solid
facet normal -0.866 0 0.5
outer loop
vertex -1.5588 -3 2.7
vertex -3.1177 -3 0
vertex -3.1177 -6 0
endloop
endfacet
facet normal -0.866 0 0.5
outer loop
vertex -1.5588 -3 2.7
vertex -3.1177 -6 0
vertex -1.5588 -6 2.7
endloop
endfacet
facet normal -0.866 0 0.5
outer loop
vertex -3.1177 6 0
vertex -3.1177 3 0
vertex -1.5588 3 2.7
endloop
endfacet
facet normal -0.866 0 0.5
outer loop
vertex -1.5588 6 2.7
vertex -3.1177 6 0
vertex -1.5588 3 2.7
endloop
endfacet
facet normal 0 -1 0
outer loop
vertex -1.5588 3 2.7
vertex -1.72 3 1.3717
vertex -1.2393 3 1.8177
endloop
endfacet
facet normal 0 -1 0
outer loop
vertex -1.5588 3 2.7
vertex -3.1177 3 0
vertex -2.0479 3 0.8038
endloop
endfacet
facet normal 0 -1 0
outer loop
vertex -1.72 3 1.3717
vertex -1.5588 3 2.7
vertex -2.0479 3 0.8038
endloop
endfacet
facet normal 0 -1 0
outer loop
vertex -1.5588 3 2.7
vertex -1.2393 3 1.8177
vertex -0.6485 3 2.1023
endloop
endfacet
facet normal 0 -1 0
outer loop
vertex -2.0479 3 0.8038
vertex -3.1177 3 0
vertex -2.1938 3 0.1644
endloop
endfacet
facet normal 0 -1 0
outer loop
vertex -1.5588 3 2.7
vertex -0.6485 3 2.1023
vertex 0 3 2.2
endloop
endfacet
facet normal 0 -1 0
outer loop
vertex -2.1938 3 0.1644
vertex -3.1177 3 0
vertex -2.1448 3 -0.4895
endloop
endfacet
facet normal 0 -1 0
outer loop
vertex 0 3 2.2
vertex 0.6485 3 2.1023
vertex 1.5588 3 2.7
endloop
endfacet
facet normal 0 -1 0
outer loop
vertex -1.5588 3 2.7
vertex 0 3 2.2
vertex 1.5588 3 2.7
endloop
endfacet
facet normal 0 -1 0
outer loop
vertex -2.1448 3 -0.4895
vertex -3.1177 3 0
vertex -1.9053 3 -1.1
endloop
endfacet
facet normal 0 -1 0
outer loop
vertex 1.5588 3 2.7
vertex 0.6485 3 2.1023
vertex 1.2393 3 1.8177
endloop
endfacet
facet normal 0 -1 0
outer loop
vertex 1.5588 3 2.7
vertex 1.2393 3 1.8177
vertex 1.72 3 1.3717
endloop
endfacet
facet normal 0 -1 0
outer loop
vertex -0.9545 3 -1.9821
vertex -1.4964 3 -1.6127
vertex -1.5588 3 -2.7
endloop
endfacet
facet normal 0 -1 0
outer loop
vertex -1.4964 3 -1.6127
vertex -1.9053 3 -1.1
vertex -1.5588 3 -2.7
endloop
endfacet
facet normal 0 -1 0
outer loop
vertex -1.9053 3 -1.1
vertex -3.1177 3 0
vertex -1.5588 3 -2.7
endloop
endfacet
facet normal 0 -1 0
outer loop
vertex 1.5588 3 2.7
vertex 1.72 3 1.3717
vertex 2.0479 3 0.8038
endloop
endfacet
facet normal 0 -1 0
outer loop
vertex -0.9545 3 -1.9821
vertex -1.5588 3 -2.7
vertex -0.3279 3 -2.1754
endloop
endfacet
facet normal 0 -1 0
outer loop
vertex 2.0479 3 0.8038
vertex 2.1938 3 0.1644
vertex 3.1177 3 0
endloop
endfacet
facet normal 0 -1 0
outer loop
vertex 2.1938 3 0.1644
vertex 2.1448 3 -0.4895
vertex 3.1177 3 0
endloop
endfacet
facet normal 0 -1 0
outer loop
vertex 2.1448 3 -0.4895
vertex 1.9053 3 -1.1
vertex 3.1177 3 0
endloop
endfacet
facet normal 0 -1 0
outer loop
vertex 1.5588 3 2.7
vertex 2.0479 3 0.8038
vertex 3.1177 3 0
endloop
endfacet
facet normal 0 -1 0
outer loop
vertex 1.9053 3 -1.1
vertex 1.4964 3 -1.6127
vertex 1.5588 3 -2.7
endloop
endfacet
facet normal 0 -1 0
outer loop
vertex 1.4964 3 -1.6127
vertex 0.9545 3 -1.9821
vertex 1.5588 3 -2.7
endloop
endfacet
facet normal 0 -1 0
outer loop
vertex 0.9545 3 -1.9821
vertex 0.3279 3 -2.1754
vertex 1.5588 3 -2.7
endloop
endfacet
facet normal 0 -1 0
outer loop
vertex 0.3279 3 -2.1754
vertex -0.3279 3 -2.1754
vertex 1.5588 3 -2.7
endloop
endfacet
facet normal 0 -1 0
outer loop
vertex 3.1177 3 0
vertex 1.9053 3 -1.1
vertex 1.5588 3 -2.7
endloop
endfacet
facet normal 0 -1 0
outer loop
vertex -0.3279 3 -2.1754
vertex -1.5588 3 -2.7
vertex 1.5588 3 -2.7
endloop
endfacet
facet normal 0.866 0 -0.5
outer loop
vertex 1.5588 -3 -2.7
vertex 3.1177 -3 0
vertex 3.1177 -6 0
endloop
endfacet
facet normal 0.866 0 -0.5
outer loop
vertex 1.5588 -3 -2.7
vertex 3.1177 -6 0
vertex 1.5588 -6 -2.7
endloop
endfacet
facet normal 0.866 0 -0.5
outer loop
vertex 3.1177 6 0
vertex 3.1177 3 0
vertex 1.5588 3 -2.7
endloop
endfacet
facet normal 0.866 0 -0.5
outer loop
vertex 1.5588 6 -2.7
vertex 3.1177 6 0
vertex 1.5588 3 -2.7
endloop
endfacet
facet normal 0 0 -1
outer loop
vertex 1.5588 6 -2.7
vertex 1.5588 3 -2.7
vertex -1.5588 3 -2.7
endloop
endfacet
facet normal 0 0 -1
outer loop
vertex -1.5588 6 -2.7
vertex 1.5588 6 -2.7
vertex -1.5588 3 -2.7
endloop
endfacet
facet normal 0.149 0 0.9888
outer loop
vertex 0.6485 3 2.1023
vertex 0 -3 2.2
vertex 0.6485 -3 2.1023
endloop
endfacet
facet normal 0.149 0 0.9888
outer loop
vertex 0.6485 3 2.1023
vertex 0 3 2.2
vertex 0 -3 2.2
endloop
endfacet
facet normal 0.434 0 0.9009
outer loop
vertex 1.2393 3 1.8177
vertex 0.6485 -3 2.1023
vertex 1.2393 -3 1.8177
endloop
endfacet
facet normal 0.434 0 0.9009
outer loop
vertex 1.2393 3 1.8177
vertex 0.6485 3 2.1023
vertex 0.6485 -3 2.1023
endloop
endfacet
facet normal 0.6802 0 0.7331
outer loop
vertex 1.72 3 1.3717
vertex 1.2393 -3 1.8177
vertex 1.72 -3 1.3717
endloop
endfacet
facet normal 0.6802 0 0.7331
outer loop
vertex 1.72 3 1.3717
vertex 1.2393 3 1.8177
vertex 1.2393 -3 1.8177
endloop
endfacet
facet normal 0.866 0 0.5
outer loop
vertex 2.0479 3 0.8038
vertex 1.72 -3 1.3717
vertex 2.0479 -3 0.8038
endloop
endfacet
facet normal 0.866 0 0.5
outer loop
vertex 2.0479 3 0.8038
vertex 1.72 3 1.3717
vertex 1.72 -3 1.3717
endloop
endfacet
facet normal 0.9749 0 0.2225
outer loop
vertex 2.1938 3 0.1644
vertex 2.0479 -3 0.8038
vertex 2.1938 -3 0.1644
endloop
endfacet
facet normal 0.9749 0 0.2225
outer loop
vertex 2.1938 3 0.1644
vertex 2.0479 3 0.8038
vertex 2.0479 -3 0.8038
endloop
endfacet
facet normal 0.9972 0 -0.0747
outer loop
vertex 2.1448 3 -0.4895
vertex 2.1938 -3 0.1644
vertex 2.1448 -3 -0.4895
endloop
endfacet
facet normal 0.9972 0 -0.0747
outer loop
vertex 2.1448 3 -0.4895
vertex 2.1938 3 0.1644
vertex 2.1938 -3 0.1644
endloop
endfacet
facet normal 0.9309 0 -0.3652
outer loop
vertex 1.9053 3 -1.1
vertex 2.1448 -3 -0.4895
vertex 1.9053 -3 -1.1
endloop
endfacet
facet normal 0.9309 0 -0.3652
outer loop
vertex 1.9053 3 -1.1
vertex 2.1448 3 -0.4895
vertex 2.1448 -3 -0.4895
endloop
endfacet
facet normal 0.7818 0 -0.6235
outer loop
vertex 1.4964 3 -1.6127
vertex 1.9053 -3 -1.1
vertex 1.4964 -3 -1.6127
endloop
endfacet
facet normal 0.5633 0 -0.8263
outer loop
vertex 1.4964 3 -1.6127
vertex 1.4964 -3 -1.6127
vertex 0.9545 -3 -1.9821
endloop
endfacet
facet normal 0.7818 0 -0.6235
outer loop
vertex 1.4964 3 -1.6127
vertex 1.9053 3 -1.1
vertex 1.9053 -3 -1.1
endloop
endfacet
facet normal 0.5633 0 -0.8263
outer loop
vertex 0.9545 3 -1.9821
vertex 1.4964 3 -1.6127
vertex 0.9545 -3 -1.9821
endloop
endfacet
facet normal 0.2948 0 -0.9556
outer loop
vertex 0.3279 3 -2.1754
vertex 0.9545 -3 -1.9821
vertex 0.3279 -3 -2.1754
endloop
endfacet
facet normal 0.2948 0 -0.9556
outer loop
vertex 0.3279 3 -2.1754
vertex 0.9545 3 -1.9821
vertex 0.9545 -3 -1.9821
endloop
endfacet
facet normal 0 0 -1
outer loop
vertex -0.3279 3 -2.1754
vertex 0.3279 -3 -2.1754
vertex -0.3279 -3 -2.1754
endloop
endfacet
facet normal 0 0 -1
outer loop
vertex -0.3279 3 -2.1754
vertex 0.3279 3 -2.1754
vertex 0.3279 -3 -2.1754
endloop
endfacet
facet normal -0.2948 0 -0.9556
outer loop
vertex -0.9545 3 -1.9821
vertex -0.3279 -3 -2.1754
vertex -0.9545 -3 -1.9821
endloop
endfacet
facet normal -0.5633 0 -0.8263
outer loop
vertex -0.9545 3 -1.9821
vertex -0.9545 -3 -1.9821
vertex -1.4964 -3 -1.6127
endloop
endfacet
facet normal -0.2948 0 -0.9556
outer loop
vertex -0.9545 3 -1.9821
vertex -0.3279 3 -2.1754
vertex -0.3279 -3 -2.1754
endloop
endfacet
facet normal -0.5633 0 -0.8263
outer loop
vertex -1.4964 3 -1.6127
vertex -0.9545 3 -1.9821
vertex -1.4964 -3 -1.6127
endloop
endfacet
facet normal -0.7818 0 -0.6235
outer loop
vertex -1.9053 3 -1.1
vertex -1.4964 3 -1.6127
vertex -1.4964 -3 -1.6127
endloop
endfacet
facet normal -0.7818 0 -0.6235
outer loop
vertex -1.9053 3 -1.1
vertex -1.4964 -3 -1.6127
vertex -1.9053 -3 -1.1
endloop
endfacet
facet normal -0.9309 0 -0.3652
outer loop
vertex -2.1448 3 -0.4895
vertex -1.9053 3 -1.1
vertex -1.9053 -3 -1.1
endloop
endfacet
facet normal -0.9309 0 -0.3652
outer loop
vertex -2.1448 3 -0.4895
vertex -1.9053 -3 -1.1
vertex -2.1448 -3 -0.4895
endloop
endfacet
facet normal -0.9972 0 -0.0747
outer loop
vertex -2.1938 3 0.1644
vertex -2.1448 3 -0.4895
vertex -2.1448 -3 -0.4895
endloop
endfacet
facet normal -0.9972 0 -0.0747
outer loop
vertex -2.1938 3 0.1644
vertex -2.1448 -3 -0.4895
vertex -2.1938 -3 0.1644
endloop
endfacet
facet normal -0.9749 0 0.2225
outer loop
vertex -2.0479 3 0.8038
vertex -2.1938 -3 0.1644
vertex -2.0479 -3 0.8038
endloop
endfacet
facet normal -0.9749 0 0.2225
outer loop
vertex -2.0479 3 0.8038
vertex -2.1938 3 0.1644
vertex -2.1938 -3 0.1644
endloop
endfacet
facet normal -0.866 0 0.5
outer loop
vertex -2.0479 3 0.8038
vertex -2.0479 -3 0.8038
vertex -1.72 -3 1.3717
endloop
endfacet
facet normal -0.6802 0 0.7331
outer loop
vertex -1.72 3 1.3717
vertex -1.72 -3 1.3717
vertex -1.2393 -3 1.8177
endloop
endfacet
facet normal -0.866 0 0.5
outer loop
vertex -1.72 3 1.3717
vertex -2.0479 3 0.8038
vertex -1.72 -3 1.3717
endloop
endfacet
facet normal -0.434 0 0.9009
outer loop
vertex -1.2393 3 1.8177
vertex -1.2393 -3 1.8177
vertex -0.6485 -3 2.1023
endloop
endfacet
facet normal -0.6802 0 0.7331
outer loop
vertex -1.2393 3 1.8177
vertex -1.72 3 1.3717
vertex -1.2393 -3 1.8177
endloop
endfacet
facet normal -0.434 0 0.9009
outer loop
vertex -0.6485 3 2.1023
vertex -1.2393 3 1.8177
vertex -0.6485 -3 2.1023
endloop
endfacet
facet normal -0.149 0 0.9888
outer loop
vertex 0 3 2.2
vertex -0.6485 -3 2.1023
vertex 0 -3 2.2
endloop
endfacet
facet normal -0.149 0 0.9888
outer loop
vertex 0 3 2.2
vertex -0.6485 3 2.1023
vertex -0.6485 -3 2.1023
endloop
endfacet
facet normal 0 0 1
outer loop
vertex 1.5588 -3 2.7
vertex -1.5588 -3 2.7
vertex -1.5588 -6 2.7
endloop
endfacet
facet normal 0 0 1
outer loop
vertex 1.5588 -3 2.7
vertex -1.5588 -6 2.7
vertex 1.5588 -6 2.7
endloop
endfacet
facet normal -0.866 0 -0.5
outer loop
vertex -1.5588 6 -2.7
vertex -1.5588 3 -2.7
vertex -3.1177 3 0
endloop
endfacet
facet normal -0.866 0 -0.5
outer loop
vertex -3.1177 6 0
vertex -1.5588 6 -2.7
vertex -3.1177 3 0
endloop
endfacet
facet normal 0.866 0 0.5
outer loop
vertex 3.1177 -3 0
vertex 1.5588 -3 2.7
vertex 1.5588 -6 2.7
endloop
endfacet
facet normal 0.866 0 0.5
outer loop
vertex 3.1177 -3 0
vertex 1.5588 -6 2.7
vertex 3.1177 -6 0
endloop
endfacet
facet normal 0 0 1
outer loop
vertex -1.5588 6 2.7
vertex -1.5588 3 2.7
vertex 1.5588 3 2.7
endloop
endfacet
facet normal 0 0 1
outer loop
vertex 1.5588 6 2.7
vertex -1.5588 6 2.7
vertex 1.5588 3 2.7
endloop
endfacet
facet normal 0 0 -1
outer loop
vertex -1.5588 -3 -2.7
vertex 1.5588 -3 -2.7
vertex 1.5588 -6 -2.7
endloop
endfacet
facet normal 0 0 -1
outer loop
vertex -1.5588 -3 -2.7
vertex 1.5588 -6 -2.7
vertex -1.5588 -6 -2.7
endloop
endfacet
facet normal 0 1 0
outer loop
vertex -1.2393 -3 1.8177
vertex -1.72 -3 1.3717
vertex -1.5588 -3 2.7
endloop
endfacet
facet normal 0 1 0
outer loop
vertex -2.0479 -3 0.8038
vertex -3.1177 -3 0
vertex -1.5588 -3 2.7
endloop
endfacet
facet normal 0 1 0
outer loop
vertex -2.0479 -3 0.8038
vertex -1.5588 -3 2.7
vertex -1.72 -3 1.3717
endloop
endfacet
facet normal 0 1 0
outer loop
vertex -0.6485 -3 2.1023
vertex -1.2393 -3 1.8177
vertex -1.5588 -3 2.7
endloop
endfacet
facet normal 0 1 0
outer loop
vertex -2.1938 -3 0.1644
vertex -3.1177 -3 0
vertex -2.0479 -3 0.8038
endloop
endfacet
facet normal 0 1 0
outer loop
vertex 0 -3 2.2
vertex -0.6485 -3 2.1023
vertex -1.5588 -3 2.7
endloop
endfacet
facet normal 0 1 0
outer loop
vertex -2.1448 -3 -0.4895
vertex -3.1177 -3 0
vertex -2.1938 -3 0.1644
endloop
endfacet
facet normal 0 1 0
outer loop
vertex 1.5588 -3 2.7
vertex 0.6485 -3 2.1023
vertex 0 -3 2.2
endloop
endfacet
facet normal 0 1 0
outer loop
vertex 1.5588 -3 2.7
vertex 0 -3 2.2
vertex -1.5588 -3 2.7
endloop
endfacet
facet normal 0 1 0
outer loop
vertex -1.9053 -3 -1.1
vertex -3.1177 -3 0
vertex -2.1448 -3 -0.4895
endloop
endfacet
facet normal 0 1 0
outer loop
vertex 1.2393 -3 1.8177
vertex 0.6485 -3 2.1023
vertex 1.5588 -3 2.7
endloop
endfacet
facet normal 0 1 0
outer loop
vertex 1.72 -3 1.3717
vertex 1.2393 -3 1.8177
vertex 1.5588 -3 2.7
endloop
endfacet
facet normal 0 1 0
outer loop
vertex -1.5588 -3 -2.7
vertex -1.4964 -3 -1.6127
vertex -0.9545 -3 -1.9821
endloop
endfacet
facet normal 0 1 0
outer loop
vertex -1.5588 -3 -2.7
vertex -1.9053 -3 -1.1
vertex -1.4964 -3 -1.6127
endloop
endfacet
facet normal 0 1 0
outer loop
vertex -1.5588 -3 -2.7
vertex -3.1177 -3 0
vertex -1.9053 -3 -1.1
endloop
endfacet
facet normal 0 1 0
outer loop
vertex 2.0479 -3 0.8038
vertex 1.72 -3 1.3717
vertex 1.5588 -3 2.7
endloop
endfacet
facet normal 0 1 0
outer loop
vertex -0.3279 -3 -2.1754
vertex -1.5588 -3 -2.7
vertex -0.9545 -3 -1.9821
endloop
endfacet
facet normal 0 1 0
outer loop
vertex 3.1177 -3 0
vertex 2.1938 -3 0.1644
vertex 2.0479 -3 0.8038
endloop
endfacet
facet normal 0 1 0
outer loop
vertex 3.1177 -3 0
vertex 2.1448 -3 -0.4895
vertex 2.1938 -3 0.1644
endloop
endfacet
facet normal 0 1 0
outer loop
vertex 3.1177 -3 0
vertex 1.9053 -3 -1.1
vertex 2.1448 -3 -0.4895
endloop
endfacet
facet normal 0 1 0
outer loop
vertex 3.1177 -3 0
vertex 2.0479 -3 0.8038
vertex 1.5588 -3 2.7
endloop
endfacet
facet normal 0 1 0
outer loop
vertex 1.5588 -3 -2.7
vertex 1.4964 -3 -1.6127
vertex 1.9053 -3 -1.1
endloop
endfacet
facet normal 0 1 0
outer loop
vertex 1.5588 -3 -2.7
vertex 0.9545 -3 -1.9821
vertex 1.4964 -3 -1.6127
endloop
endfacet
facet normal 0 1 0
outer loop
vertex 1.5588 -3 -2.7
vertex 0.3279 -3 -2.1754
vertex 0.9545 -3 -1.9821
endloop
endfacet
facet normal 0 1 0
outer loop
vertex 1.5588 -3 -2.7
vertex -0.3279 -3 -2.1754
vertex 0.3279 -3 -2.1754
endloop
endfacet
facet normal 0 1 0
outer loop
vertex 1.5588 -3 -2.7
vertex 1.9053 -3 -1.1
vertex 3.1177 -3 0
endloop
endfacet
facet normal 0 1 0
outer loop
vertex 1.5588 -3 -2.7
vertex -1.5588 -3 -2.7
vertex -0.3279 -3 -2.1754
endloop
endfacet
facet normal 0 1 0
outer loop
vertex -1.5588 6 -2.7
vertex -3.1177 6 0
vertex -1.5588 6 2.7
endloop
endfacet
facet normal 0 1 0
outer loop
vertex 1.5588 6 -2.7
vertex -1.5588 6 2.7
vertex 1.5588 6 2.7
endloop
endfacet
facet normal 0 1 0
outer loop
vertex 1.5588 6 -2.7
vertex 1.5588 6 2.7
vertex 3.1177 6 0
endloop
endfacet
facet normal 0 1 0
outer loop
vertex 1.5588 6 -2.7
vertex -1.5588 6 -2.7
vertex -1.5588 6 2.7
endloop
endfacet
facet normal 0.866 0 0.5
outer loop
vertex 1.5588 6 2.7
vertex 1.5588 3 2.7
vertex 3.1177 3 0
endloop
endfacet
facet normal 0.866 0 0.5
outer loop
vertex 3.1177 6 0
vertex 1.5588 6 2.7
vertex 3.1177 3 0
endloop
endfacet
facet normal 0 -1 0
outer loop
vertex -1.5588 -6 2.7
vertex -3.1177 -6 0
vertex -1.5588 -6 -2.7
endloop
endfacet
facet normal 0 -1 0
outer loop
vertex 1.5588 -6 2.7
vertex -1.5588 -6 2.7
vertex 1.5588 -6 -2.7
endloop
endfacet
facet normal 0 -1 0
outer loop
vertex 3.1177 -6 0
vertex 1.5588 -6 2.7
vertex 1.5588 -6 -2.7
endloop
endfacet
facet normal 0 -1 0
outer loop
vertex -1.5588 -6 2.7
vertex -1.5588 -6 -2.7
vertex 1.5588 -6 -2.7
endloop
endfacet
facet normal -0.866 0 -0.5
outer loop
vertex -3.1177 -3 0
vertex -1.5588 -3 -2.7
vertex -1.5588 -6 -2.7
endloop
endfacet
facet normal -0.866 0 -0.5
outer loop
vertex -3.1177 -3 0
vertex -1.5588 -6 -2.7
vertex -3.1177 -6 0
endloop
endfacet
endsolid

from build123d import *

# Parameters (mm, degrees)
SKETCH1_R           = 2.2
BOSS_EXTRUDE1_DEPTH = 3
BOSS_EXTRUDE2_DEPTH = 3


with BuildPart() as part:
    # Sketch1 → Boss-Extrude1 (new body)
    with BuildSketch(Plane(origin=(0, 0, 0), x_dir=(1, 0, 0), z_dir=(0, 1, 0))):
        with Locations(Location((0, 0, 0), (0, 0, 270))):
            Circle(SKETCH1_R)
    boss_extrude1 = extrude(amount=BOSS_EXTRUDE1_DEPTH)

    # Sketch2 → Boss-Extrude2 (add)
    with BuildSketch(Plane(origin=(0, 3, 0), x_dir=(1, 0, 0), z_dir=(0, 1, 0))):
        Polygon((-1.558845727, 2.7), (-3.117691454, 0), (-1.558845727, -2.7), (1.558845727, -2.7), (3.117691454, 0), (1.558845727, 2.7), align=None)
    boss_extrude2 = extrude(amount=BOSS_EXTRUDE2_DEPTH)

    # Mirror1: Boss-Extrude1, Boss-Extrude2 across plane
    add(boss_extrude1.mirror(Plane.ZX))
    add(boss_extrude2.mirror(Plane.ZX))


solid = part.part
